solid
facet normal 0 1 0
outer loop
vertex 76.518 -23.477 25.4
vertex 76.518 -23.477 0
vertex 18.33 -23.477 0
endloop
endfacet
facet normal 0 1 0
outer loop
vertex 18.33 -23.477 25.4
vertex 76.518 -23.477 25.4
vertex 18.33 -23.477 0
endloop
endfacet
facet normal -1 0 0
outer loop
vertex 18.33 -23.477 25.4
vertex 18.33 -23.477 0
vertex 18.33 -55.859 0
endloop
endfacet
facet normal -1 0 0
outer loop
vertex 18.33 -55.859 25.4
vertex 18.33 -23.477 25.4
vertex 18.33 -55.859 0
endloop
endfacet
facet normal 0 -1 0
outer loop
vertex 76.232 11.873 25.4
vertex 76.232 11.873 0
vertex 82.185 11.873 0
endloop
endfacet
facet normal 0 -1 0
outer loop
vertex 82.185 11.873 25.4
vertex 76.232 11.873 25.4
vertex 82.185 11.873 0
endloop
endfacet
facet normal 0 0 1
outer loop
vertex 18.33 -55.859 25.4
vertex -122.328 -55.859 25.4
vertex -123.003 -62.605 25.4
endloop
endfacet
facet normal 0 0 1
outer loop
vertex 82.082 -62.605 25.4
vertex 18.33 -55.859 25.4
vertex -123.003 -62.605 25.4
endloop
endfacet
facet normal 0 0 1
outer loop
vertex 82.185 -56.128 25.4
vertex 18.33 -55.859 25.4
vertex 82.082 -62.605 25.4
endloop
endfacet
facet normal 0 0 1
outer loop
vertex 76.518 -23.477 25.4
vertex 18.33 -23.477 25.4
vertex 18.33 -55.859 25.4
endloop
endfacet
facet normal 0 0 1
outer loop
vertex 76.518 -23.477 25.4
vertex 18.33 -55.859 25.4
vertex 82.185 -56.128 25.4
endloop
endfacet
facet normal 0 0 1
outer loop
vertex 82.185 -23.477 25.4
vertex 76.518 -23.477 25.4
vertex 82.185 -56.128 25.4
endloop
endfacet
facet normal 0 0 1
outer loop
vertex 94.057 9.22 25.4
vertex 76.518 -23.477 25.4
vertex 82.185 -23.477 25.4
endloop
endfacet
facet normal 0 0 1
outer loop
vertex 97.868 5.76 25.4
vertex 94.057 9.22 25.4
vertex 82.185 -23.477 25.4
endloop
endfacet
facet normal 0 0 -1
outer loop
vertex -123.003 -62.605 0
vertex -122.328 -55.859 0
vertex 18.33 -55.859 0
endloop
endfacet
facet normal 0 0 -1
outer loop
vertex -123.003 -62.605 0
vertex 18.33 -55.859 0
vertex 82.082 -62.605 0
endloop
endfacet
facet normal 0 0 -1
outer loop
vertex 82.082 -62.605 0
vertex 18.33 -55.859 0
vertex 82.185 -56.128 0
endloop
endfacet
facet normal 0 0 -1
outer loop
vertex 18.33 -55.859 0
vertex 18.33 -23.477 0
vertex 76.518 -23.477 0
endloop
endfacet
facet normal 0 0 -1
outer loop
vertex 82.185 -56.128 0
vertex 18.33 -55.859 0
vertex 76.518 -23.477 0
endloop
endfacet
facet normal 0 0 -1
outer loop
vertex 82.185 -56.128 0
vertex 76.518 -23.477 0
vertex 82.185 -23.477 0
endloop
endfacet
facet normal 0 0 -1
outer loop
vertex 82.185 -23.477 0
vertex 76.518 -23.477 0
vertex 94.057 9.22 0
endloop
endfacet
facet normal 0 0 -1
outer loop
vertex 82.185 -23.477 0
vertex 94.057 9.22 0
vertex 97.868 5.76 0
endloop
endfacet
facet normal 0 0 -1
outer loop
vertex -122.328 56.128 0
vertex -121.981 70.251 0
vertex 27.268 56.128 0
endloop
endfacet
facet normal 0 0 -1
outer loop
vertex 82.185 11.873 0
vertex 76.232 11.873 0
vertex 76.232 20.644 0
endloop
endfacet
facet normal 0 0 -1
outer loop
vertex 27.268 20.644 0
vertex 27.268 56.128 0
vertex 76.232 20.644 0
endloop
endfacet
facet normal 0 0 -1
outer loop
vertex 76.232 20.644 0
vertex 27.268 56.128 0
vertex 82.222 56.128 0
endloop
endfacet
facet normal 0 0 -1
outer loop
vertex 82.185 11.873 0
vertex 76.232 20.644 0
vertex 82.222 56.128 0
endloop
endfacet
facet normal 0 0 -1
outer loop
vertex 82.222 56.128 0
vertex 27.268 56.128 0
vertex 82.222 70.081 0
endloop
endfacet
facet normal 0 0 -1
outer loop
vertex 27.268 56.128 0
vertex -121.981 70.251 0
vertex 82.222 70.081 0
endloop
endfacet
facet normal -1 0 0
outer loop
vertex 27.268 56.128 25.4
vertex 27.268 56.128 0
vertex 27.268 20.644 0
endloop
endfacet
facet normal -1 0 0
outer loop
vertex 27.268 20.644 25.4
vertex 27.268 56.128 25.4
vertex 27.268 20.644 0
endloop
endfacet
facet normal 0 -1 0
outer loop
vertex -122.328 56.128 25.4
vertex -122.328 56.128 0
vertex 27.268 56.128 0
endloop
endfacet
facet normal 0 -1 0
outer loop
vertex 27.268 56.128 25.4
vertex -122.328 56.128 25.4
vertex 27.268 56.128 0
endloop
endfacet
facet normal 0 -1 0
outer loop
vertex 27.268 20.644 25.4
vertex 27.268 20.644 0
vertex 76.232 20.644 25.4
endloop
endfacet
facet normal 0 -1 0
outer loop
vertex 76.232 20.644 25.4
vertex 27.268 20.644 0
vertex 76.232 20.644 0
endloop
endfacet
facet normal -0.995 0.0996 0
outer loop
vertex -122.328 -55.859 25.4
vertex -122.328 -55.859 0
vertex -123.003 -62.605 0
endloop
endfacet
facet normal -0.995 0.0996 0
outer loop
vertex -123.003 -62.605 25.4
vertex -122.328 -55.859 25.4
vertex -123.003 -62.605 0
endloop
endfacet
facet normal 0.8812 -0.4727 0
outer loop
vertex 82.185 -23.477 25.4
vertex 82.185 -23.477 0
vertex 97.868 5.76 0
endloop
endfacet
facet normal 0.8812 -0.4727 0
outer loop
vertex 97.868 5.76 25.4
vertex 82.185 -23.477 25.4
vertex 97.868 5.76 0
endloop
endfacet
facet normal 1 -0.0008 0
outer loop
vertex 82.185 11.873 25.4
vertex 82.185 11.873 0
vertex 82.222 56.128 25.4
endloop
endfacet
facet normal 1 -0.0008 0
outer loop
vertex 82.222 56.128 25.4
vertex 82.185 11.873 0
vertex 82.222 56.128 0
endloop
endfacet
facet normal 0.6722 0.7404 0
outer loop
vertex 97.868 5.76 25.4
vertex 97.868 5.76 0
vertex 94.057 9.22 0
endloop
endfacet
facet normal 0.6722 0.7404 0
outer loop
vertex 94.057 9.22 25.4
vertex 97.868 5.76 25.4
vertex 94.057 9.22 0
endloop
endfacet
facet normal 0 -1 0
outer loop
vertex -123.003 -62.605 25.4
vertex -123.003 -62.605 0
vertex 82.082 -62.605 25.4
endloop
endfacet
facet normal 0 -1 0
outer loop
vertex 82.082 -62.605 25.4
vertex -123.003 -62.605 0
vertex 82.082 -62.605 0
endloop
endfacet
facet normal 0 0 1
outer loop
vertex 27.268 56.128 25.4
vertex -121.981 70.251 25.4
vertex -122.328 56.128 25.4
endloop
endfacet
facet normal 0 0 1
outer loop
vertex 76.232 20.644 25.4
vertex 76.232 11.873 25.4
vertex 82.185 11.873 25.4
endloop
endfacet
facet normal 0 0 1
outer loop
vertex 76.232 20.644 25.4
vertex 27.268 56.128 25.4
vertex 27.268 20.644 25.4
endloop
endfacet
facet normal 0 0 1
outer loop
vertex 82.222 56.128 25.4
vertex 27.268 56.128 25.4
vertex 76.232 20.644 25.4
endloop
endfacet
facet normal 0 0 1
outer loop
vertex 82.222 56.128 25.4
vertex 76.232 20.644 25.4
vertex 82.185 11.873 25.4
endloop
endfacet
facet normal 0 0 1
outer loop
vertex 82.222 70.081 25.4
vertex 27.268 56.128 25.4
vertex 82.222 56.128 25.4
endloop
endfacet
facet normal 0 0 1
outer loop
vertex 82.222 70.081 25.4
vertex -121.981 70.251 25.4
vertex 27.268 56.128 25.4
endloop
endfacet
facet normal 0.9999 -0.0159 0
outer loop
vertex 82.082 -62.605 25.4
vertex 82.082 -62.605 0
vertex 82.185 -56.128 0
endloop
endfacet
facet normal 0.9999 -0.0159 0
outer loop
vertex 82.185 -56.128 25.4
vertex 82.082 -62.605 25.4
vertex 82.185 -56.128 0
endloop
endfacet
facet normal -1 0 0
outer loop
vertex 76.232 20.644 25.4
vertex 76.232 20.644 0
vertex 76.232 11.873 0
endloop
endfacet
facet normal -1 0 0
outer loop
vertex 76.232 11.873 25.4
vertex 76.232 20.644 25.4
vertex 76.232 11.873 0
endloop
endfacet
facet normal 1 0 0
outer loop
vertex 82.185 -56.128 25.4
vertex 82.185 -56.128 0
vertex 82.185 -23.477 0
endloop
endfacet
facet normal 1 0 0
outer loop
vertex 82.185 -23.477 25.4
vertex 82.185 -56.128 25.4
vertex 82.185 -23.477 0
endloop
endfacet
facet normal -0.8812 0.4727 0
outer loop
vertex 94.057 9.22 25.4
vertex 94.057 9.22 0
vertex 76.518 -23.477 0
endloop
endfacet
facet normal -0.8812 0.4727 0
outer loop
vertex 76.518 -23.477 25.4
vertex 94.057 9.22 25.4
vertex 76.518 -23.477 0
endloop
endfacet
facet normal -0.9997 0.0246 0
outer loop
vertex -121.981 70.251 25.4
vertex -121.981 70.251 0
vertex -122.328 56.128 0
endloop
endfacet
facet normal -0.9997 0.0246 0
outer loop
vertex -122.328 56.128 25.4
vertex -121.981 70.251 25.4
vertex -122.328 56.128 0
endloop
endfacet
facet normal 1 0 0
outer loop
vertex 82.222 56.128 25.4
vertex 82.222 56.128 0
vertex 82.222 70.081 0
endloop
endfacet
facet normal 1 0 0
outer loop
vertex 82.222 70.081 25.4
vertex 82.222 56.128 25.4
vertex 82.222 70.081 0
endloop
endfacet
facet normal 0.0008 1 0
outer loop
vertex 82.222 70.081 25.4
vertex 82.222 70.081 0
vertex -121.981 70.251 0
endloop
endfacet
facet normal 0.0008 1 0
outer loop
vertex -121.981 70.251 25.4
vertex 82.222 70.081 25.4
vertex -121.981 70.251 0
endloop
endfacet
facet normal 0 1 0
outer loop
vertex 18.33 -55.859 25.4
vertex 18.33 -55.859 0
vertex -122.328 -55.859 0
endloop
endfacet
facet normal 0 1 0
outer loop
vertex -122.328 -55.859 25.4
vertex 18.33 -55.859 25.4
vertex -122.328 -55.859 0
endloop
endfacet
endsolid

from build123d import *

# Parameters (mm, degrees)
F0_W     = 48.9641427994
F0_H     = 5.7181753218
F0_H_2   = 29.7665968537
F1_DEPTH = 25.4


with BuildPart() as f1:
    # F0 (on Top) → F1 (new body)
    with BuildSketch(Plane.XY):
        Polygon((82.2217017412, 56.1284311116), (76.2321278453, 56.1284311116), (76.2321278453, 50.4102557898), (76.2321278453, 20.643658936), (76.2321278453, 11.873322539), (82.1848511696, 11.873322539), align=None)
        Polygon((27.2679850459, 56.1284311116), (76.2321278453, 56.1284311116), (82.2217017412, 56.1284311116), (82.2217017412, 70.08125633), (-121.9809266551, 70.2512928259), (-122.3282516003, 56.1284311116), (18.3303970844, 56.1284311116), align=None)
        with Locations((51.7500564456, 53.2693434507)):
            Rectangle(F0_W, F0_H)
        with Locations((51.7500564456, 35.5269573629)):
            Rectangle(F0_W, F0_H_2)
    extrude(amount=F1_DEPTH)


with BuildPart() as f1b:
    # F0 (on Top) → F1, piece 2 (new body)
    with BuildSketch(Plane.XY):
        Polygon((18.3303970844, -55.8585859835), (-122.3282516003, -55.8585859835), (-123.0027005076, -62.6047924161), (82.0819586515, -62.6047924161), (82.1848511696, -56.1284311116), (76.5180364251, -55.8585859835), (27.2679850459, -55.8585859835), align=None)
        Polygon((18.3303970844, -23.4767962247), (18.3303970844, -55.8585859835), (27.2679850459, -55.8585859835), (27.2679850459, -38.5079085827), (27.2679850459, -23.4767962247), align=None)
        Polygon((27.2679850459, -38.5079085827), (27.2679850459, -55.8585859835), (76.5180364251, -55.8585859835), (76.5180364251, -23.4767962247), (27.2679850459, -23.4767962247), align=None)
        Polygon((76.5180364251, -23.4767962247), (76.5180364251, -55.8585859835), (82.1848511696, -56.1284311116), (82.1848511696, -23.4767962247), align=None)
        Polygon((94.0572333674, 9.2199633728), (76.5180364251, -23.4767962247), (82.1848511696, -23.4767962247), (97.8682488203, 5.7603623718), align=None)
    extrude(amount=F1_DEPTH)


solid = Compound([f1.part, f1b.part])
